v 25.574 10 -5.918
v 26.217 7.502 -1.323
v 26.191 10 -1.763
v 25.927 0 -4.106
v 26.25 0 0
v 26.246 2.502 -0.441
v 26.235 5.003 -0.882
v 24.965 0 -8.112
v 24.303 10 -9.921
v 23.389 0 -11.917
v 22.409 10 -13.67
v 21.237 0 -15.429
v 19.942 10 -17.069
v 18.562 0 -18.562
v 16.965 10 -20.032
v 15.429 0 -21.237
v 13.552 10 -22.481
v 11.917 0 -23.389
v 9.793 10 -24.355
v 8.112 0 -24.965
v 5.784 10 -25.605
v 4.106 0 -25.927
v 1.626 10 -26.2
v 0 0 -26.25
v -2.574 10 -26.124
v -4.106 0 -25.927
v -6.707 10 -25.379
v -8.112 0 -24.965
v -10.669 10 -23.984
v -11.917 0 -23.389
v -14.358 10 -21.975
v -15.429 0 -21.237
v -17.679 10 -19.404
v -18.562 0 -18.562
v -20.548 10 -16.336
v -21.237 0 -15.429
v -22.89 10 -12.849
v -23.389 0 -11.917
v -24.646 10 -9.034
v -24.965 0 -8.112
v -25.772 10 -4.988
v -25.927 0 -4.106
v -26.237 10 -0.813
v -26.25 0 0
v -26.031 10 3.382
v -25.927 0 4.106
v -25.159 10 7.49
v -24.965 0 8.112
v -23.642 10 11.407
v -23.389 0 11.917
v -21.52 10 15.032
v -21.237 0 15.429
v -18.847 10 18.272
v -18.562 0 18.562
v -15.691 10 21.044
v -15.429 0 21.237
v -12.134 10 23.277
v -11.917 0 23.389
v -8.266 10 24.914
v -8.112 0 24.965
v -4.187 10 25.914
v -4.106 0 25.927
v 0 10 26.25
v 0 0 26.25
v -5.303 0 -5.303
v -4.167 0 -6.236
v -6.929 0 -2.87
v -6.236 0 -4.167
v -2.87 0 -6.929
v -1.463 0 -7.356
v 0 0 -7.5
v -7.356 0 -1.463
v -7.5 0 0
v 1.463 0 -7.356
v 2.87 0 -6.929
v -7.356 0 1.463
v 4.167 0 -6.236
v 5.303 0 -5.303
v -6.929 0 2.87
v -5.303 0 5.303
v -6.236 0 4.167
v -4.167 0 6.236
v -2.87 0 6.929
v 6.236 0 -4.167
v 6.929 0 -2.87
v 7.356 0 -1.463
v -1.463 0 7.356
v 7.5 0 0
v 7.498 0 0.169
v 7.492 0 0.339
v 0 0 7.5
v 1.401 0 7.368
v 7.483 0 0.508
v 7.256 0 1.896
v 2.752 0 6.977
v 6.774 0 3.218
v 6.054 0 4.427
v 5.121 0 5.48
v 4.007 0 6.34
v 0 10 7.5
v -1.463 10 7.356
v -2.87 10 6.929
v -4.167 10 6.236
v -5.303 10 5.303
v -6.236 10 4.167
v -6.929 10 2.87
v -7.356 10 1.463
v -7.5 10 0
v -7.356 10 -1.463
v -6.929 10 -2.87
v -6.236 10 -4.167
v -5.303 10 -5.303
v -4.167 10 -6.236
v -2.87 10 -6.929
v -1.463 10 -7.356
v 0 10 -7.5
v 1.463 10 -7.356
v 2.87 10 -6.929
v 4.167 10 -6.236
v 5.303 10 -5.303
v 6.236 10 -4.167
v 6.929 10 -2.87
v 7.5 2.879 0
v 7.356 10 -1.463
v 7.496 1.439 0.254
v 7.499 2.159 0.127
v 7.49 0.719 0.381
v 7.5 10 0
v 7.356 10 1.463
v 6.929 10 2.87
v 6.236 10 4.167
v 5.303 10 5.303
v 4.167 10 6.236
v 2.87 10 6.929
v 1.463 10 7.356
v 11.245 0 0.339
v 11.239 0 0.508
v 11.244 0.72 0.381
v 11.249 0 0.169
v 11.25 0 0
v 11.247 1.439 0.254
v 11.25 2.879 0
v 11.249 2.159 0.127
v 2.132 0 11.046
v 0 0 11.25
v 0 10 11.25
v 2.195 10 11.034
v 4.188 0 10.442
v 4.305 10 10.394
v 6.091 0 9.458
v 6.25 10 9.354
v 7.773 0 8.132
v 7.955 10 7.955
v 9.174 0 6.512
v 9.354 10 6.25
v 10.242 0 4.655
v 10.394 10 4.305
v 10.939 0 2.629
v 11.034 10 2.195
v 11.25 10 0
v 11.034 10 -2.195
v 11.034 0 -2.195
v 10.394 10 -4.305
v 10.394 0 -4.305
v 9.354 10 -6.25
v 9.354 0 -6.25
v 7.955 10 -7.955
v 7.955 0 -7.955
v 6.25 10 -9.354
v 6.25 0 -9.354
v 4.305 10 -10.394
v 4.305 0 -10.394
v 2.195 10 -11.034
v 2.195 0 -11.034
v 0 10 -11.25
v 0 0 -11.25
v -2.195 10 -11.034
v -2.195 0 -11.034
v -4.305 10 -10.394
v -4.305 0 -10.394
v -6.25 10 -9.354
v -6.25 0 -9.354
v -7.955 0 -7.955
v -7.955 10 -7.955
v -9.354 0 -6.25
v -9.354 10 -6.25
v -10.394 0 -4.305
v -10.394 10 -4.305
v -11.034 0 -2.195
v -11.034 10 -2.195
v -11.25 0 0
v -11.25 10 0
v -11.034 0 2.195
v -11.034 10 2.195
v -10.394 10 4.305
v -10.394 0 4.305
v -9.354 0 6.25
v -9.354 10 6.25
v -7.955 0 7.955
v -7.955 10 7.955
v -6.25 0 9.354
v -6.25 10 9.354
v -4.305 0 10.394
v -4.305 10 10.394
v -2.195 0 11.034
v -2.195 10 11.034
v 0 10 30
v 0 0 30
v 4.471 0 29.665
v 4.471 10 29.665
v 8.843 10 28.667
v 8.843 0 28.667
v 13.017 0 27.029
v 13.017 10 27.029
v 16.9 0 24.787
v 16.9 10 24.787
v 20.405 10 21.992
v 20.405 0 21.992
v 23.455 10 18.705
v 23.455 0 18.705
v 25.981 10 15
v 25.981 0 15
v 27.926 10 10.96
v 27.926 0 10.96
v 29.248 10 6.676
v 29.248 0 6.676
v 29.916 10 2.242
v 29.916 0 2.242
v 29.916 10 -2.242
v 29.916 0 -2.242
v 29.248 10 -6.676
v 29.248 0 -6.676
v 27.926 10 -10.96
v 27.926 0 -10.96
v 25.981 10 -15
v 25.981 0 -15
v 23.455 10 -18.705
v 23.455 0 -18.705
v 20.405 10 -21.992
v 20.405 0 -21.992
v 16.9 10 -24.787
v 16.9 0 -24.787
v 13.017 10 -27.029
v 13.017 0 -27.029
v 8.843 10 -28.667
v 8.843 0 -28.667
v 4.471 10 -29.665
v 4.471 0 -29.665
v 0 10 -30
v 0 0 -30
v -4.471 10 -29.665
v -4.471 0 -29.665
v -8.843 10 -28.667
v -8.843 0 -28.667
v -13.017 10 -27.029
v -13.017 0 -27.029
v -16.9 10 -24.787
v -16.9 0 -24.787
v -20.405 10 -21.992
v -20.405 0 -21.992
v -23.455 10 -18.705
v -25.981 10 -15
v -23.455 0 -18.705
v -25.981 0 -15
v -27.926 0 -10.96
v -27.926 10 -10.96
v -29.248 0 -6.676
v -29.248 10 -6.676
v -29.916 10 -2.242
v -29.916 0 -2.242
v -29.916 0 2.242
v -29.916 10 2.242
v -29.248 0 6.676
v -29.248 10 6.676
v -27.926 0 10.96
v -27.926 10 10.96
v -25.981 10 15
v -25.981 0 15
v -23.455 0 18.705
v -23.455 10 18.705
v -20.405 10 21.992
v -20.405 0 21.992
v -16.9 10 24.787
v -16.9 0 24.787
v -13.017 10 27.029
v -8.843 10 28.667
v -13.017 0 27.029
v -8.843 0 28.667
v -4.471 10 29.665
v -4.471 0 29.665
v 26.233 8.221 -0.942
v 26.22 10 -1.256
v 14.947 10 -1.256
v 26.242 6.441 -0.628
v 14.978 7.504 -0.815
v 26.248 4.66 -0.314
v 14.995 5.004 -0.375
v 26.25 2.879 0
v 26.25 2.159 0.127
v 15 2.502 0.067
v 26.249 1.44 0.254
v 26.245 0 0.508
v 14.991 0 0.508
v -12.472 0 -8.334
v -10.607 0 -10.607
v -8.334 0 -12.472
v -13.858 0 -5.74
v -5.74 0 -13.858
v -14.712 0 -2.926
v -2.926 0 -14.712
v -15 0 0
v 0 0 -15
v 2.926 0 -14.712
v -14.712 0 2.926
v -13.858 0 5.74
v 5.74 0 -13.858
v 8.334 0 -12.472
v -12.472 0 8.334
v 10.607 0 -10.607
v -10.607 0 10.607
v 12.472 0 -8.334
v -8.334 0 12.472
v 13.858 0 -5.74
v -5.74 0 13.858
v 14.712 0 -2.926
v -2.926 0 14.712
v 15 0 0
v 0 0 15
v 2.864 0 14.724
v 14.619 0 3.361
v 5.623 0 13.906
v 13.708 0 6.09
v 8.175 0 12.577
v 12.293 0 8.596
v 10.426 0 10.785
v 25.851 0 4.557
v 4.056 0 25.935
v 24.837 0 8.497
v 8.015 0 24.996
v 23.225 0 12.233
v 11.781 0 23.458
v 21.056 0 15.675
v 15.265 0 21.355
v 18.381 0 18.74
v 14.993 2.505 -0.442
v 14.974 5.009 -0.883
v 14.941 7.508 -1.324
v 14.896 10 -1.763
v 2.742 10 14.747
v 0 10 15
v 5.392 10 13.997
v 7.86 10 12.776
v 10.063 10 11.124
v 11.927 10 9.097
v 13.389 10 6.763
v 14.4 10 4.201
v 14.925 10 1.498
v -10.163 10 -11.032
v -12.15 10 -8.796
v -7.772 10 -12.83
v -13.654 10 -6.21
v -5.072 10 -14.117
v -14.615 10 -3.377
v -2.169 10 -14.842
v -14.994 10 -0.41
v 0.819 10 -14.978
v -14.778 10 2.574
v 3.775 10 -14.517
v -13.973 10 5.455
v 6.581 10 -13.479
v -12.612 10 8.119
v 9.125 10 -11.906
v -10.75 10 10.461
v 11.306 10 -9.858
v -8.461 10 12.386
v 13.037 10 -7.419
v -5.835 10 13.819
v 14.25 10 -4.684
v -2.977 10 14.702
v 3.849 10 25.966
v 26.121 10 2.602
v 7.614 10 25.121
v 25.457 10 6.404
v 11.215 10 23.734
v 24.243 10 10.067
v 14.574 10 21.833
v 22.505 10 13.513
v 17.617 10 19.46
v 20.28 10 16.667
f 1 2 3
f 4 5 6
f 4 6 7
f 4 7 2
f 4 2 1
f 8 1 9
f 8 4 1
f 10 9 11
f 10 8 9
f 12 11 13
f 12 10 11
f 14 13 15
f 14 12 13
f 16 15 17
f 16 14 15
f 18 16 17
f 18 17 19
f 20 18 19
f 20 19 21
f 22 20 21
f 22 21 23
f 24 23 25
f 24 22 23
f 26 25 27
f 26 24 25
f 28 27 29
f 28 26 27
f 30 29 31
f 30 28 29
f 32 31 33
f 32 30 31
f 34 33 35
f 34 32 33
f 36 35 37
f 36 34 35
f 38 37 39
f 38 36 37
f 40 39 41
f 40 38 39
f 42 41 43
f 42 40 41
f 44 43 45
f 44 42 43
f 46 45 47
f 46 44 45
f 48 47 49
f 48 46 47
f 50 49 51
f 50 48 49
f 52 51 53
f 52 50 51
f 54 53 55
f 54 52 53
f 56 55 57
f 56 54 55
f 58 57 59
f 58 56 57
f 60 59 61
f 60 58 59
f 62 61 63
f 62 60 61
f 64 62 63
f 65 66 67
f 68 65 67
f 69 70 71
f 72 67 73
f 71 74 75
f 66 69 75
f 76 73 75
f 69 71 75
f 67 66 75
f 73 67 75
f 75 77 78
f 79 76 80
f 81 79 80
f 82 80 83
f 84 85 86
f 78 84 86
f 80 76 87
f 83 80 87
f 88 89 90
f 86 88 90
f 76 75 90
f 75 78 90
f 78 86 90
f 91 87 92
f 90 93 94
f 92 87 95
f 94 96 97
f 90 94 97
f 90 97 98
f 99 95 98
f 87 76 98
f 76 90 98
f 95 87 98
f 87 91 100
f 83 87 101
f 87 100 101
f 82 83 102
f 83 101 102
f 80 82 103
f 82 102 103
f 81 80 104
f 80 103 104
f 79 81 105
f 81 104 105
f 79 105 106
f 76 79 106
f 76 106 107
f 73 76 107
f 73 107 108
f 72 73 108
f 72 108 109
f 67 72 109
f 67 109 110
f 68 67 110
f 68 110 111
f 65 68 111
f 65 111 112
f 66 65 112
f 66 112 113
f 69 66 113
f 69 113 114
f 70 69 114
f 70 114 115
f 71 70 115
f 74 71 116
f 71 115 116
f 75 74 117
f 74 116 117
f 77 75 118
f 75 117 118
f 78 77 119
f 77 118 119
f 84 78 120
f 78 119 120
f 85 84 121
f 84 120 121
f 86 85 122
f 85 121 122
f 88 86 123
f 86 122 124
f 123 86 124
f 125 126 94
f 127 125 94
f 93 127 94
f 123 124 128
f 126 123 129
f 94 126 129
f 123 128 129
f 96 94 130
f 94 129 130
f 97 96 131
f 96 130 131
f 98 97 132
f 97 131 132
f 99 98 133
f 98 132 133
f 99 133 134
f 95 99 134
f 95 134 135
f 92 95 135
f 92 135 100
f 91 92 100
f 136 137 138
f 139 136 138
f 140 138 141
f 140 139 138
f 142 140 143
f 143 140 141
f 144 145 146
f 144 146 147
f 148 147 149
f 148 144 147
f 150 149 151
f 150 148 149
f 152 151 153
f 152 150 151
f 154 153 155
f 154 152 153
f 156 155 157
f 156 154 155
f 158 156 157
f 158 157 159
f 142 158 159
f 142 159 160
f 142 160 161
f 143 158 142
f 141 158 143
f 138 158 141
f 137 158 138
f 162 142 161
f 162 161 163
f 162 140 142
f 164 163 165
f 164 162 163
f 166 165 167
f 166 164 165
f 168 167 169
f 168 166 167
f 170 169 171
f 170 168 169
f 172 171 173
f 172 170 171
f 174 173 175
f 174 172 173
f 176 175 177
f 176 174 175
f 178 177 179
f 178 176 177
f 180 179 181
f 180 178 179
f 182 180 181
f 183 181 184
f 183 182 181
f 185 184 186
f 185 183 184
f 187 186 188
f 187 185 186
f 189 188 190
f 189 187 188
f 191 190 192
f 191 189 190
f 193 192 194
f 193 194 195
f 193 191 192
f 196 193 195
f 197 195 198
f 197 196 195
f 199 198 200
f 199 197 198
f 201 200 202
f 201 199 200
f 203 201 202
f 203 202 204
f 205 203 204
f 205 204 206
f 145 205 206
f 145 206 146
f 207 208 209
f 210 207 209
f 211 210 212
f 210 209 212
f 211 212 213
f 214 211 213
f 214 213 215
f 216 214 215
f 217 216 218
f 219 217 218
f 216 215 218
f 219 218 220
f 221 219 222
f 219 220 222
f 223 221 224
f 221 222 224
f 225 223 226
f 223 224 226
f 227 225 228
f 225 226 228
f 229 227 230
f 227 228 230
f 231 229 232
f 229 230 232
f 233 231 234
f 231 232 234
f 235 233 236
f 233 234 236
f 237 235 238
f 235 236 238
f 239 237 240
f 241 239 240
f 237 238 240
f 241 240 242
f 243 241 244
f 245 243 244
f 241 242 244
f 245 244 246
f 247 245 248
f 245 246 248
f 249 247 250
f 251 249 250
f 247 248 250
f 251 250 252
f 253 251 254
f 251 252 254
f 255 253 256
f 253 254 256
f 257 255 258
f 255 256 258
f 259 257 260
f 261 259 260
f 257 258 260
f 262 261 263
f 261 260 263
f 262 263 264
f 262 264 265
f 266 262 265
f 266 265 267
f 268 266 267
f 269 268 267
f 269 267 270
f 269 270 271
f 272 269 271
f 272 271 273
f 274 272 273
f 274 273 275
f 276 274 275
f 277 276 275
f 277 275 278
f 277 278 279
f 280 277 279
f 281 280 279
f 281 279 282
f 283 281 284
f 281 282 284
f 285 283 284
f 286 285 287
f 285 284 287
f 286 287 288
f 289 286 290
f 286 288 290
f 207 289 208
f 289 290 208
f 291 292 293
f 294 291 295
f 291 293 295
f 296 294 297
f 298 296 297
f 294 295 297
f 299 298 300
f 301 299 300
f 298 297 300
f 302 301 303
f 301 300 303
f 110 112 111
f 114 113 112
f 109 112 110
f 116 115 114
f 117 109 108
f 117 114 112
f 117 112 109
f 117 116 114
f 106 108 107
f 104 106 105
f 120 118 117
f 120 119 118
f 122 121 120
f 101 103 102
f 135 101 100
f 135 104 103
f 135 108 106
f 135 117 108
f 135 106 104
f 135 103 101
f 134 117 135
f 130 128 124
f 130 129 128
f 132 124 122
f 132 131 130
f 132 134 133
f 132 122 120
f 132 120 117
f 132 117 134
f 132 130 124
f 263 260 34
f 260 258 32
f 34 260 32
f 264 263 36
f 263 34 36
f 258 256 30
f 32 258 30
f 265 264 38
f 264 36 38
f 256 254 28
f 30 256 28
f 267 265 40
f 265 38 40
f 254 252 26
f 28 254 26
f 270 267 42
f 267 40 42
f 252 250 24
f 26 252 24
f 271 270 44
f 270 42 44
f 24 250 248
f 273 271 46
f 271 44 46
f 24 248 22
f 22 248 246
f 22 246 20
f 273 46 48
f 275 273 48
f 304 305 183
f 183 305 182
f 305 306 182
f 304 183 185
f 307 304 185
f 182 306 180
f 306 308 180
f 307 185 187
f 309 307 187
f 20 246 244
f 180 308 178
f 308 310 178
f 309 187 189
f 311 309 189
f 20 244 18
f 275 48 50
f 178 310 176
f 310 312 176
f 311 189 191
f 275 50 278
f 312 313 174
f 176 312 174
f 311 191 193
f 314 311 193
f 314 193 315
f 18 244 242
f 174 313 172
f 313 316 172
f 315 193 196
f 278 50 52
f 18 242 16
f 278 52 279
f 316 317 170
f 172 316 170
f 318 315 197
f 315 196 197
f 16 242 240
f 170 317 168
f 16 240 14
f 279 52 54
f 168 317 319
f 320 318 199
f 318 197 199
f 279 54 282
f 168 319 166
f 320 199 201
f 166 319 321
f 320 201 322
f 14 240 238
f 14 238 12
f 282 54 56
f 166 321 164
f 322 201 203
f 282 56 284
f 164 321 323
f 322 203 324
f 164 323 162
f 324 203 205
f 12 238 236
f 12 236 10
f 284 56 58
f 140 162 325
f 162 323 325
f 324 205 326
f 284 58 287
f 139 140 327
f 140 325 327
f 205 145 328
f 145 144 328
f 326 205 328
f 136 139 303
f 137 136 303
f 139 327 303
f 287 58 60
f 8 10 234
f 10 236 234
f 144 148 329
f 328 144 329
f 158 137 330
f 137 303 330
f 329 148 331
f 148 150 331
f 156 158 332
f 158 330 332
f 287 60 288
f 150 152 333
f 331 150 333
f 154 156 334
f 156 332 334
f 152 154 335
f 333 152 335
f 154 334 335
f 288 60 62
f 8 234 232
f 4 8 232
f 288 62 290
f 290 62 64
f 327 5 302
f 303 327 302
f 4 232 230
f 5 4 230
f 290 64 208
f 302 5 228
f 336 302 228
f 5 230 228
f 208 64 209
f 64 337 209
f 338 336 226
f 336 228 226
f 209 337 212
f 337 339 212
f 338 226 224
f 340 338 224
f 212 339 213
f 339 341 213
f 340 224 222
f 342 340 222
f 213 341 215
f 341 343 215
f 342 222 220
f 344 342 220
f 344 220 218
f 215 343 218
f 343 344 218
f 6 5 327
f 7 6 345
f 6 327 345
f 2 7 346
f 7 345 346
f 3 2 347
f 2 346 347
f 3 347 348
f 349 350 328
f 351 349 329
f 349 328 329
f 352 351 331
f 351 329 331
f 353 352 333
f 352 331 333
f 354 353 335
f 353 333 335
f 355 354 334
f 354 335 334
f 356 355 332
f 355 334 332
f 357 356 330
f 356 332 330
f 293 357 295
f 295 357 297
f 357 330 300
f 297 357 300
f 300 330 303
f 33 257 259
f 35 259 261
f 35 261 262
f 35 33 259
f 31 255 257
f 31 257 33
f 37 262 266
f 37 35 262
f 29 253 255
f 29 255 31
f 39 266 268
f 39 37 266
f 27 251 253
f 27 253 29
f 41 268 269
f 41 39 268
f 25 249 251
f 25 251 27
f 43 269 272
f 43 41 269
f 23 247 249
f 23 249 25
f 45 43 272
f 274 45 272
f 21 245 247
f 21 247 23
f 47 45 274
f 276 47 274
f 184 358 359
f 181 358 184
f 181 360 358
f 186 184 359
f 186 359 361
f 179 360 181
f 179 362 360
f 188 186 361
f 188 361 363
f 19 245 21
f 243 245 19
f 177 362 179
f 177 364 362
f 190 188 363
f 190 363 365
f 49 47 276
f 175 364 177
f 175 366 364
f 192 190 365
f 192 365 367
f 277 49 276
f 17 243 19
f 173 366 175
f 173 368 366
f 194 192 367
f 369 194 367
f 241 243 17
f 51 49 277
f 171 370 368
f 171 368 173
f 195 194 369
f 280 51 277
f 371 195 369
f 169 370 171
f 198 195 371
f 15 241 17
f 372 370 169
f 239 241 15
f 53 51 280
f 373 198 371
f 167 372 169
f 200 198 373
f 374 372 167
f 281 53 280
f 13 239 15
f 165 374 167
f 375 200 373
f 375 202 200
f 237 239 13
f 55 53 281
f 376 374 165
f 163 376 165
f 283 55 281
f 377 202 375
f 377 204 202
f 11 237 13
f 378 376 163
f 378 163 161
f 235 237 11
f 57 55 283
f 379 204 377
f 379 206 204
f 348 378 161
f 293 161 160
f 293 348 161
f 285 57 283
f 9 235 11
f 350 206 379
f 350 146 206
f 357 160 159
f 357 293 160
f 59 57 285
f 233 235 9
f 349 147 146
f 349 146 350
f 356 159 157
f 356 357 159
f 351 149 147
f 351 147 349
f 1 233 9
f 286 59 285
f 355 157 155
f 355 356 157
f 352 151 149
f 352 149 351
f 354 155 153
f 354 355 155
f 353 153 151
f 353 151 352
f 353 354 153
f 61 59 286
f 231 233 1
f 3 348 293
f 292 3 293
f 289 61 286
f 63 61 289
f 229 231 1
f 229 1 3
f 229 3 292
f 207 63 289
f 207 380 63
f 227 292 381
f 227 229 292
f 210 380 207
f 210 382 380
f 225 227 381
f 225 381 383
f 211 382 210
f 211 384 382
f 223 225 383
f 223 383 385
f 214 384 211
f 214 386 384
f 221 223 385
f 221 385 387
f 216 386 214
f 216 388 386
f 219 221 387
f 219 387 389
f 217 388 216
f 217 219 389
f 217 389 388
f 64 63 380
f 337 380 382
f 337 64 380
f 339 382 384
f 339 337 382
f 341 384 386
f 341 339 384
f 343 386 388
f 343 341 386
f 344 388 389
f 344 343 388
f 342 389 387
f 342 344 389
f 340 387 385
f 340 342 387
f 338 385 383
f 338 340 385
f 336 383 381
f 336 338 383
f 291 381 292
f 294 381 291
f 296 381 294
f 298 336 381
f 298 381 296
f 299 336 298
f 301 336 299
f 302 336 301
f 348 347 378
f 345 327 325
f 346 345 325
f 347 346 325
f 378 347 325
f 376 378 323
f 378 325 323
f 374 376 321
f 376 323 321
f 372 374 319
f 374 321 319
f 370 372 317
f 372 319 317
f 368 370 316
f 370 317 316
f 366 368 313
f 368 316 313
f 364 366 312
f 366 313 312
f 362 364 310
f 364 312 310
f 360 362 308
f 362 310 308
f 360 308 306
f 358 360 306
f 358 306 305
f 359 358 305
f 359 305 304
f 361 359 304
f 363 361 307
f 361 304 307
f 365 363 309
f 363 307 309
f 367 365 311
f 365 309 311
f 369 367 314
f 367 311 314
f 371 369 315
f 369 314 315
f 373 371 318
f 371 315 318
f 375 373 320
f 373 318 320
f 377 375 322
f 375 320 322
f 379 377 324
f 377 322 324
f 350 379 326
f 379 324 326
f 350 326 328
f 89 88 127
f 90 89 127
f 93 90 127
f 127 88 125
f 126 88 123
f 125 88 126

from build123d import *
from build123d.topology import SkipClean

# Parameters (mm, degrees)
SKETCH1_R             = 7.5
BOSS_EXTRUDE1_DEPTH   = 10
SKETCH1_R_2           = 15
SKETCH1_R_3           = 11.25
BOSS_EXTRUDE1_2_DEPTH = 10
SKETCH1_R_4           = 30
SKETCH1_R_5           = 26.25
BOSS_EXTRUDE1_3_DEPTH = 10
BOSS_EXTRUDE2_START   = 7.289779118
BOSS_EXTRUDE2_DEPTH   = 18.960220882
SKETCH10_W            = 3.75
SKETCH10_H            = 10


# Read off the part's stored shape, not the designer's step: Boss-Extrude2
with BuildPart() as part:
    # Sketch1 → Boss-Extrude1 (new body)
    with BuildSketch(Plane(origin=(0, 0, 0), x_dir=(1, 0, 0), z_dir=(0, 1, 0))):
        with Locations(Location((0, 0, 0), (0, 0, 270))):
            Circle(SKETCH1_R)
    extrude(amount=BOSS_EXTRUDE1_DEPTH)



with BuildPart() as body_2:
    # Sketch1 → Boss-Extrude1 2 (new body)
    with BuildSketch(Plane(origin=(0, 0, 0), x_dir=(1, 0, 0), z_dir=(0, 1, 0))):
        with Locations(Location((0, 0, 0), (0, 0, 270))):
            Circle(SKETCH1_R_2)
        with Locations(Location((0, 0, 0), (0, 0, 270))):
            Circle(SKETCH1_R_3, mode=Mode.SUBTRACT)
    extrude(amount=BOSS_EXTRUDE1_2_DEPTH)


with BuildPart() as body_3:
    # Sketch1 → Boss-Extrude1 3 (new body)
    with BuildSketch(Plane(origin=(0, 0, 0), x_dir=(1, 0, 0), z_dir=(0, 1, 0))):
        with Locations(Location((0, 0, 0), (0, 0, 270))):
            Circle(SKETCH1_R_4)
        with Locations(Location((0, 0, 0), (0, 0, 270))):
            Circle(SKETCH1_R_5, mode=Mode.SUBTRACT)
    extrude(amount=BOSS_EXTRUDE1_3_DEPTH)


with BuildPart() as part_1:
    add(part.part)

    add(body_2.part)  # Boss-Extrude2 merges body 2

    add(body_3.part)  # Boss-Extrude2 merges body 3
    # Boss-Extrude2 outline → Boss-Extrude2 (add)
    with BuildSketch(Plane(origin=(0, 0, 0), x_dir=(0, 0, -1), z_dir=(1, 0, 0)).offset(BOSS_EXTRUDE2_START)):
        Polygon((0, 0), (1.763269807, 10), (1.255556501, 10), (-0.507713306, 0), align=None)
    extrude(amount=BOSS_EXTRUDE2_DEPTH)

    # Sketch10 → Cut-Revolve1 (revolve, cut)
    with SkipClean():  # the faces are left unmerged after this step: merging them gives an invalid solid
        with BuildSketch(Plane.XY):
            with Locations((9.375, 5)):
                Rectangle(SKETCH10_W, SKETCH10_H)
        revolve(axis=Axis((0, 85.419330933, 0), (0, -1, 0)), mode=Mode.SUBTRACT)
    add(part_1.part.scale(1), mode=Mode.REPLACE)  # the faces are merged on a copy


with BuildPart() as cut_revolve1_piece_1:
    # of the separate pieces the step leaves, piece 1, a body of its own (cut_revolve1_pieces)
    add(part_1.part.solids().sort_by_distance((0, 0, 11.25))[0])


with BuildPart() as cut_revolve1_piece_2:
    # of the separate pieces the step leaves, piece 2, a body of its own (cut_revolve1_pieces)
    add(part_1.part.solids().sort_by_distance((0, 0, 7.5))[0])


solid = Compound([cut_revolve1_piece_1.part, cut_revolve1_piece_2.part])
